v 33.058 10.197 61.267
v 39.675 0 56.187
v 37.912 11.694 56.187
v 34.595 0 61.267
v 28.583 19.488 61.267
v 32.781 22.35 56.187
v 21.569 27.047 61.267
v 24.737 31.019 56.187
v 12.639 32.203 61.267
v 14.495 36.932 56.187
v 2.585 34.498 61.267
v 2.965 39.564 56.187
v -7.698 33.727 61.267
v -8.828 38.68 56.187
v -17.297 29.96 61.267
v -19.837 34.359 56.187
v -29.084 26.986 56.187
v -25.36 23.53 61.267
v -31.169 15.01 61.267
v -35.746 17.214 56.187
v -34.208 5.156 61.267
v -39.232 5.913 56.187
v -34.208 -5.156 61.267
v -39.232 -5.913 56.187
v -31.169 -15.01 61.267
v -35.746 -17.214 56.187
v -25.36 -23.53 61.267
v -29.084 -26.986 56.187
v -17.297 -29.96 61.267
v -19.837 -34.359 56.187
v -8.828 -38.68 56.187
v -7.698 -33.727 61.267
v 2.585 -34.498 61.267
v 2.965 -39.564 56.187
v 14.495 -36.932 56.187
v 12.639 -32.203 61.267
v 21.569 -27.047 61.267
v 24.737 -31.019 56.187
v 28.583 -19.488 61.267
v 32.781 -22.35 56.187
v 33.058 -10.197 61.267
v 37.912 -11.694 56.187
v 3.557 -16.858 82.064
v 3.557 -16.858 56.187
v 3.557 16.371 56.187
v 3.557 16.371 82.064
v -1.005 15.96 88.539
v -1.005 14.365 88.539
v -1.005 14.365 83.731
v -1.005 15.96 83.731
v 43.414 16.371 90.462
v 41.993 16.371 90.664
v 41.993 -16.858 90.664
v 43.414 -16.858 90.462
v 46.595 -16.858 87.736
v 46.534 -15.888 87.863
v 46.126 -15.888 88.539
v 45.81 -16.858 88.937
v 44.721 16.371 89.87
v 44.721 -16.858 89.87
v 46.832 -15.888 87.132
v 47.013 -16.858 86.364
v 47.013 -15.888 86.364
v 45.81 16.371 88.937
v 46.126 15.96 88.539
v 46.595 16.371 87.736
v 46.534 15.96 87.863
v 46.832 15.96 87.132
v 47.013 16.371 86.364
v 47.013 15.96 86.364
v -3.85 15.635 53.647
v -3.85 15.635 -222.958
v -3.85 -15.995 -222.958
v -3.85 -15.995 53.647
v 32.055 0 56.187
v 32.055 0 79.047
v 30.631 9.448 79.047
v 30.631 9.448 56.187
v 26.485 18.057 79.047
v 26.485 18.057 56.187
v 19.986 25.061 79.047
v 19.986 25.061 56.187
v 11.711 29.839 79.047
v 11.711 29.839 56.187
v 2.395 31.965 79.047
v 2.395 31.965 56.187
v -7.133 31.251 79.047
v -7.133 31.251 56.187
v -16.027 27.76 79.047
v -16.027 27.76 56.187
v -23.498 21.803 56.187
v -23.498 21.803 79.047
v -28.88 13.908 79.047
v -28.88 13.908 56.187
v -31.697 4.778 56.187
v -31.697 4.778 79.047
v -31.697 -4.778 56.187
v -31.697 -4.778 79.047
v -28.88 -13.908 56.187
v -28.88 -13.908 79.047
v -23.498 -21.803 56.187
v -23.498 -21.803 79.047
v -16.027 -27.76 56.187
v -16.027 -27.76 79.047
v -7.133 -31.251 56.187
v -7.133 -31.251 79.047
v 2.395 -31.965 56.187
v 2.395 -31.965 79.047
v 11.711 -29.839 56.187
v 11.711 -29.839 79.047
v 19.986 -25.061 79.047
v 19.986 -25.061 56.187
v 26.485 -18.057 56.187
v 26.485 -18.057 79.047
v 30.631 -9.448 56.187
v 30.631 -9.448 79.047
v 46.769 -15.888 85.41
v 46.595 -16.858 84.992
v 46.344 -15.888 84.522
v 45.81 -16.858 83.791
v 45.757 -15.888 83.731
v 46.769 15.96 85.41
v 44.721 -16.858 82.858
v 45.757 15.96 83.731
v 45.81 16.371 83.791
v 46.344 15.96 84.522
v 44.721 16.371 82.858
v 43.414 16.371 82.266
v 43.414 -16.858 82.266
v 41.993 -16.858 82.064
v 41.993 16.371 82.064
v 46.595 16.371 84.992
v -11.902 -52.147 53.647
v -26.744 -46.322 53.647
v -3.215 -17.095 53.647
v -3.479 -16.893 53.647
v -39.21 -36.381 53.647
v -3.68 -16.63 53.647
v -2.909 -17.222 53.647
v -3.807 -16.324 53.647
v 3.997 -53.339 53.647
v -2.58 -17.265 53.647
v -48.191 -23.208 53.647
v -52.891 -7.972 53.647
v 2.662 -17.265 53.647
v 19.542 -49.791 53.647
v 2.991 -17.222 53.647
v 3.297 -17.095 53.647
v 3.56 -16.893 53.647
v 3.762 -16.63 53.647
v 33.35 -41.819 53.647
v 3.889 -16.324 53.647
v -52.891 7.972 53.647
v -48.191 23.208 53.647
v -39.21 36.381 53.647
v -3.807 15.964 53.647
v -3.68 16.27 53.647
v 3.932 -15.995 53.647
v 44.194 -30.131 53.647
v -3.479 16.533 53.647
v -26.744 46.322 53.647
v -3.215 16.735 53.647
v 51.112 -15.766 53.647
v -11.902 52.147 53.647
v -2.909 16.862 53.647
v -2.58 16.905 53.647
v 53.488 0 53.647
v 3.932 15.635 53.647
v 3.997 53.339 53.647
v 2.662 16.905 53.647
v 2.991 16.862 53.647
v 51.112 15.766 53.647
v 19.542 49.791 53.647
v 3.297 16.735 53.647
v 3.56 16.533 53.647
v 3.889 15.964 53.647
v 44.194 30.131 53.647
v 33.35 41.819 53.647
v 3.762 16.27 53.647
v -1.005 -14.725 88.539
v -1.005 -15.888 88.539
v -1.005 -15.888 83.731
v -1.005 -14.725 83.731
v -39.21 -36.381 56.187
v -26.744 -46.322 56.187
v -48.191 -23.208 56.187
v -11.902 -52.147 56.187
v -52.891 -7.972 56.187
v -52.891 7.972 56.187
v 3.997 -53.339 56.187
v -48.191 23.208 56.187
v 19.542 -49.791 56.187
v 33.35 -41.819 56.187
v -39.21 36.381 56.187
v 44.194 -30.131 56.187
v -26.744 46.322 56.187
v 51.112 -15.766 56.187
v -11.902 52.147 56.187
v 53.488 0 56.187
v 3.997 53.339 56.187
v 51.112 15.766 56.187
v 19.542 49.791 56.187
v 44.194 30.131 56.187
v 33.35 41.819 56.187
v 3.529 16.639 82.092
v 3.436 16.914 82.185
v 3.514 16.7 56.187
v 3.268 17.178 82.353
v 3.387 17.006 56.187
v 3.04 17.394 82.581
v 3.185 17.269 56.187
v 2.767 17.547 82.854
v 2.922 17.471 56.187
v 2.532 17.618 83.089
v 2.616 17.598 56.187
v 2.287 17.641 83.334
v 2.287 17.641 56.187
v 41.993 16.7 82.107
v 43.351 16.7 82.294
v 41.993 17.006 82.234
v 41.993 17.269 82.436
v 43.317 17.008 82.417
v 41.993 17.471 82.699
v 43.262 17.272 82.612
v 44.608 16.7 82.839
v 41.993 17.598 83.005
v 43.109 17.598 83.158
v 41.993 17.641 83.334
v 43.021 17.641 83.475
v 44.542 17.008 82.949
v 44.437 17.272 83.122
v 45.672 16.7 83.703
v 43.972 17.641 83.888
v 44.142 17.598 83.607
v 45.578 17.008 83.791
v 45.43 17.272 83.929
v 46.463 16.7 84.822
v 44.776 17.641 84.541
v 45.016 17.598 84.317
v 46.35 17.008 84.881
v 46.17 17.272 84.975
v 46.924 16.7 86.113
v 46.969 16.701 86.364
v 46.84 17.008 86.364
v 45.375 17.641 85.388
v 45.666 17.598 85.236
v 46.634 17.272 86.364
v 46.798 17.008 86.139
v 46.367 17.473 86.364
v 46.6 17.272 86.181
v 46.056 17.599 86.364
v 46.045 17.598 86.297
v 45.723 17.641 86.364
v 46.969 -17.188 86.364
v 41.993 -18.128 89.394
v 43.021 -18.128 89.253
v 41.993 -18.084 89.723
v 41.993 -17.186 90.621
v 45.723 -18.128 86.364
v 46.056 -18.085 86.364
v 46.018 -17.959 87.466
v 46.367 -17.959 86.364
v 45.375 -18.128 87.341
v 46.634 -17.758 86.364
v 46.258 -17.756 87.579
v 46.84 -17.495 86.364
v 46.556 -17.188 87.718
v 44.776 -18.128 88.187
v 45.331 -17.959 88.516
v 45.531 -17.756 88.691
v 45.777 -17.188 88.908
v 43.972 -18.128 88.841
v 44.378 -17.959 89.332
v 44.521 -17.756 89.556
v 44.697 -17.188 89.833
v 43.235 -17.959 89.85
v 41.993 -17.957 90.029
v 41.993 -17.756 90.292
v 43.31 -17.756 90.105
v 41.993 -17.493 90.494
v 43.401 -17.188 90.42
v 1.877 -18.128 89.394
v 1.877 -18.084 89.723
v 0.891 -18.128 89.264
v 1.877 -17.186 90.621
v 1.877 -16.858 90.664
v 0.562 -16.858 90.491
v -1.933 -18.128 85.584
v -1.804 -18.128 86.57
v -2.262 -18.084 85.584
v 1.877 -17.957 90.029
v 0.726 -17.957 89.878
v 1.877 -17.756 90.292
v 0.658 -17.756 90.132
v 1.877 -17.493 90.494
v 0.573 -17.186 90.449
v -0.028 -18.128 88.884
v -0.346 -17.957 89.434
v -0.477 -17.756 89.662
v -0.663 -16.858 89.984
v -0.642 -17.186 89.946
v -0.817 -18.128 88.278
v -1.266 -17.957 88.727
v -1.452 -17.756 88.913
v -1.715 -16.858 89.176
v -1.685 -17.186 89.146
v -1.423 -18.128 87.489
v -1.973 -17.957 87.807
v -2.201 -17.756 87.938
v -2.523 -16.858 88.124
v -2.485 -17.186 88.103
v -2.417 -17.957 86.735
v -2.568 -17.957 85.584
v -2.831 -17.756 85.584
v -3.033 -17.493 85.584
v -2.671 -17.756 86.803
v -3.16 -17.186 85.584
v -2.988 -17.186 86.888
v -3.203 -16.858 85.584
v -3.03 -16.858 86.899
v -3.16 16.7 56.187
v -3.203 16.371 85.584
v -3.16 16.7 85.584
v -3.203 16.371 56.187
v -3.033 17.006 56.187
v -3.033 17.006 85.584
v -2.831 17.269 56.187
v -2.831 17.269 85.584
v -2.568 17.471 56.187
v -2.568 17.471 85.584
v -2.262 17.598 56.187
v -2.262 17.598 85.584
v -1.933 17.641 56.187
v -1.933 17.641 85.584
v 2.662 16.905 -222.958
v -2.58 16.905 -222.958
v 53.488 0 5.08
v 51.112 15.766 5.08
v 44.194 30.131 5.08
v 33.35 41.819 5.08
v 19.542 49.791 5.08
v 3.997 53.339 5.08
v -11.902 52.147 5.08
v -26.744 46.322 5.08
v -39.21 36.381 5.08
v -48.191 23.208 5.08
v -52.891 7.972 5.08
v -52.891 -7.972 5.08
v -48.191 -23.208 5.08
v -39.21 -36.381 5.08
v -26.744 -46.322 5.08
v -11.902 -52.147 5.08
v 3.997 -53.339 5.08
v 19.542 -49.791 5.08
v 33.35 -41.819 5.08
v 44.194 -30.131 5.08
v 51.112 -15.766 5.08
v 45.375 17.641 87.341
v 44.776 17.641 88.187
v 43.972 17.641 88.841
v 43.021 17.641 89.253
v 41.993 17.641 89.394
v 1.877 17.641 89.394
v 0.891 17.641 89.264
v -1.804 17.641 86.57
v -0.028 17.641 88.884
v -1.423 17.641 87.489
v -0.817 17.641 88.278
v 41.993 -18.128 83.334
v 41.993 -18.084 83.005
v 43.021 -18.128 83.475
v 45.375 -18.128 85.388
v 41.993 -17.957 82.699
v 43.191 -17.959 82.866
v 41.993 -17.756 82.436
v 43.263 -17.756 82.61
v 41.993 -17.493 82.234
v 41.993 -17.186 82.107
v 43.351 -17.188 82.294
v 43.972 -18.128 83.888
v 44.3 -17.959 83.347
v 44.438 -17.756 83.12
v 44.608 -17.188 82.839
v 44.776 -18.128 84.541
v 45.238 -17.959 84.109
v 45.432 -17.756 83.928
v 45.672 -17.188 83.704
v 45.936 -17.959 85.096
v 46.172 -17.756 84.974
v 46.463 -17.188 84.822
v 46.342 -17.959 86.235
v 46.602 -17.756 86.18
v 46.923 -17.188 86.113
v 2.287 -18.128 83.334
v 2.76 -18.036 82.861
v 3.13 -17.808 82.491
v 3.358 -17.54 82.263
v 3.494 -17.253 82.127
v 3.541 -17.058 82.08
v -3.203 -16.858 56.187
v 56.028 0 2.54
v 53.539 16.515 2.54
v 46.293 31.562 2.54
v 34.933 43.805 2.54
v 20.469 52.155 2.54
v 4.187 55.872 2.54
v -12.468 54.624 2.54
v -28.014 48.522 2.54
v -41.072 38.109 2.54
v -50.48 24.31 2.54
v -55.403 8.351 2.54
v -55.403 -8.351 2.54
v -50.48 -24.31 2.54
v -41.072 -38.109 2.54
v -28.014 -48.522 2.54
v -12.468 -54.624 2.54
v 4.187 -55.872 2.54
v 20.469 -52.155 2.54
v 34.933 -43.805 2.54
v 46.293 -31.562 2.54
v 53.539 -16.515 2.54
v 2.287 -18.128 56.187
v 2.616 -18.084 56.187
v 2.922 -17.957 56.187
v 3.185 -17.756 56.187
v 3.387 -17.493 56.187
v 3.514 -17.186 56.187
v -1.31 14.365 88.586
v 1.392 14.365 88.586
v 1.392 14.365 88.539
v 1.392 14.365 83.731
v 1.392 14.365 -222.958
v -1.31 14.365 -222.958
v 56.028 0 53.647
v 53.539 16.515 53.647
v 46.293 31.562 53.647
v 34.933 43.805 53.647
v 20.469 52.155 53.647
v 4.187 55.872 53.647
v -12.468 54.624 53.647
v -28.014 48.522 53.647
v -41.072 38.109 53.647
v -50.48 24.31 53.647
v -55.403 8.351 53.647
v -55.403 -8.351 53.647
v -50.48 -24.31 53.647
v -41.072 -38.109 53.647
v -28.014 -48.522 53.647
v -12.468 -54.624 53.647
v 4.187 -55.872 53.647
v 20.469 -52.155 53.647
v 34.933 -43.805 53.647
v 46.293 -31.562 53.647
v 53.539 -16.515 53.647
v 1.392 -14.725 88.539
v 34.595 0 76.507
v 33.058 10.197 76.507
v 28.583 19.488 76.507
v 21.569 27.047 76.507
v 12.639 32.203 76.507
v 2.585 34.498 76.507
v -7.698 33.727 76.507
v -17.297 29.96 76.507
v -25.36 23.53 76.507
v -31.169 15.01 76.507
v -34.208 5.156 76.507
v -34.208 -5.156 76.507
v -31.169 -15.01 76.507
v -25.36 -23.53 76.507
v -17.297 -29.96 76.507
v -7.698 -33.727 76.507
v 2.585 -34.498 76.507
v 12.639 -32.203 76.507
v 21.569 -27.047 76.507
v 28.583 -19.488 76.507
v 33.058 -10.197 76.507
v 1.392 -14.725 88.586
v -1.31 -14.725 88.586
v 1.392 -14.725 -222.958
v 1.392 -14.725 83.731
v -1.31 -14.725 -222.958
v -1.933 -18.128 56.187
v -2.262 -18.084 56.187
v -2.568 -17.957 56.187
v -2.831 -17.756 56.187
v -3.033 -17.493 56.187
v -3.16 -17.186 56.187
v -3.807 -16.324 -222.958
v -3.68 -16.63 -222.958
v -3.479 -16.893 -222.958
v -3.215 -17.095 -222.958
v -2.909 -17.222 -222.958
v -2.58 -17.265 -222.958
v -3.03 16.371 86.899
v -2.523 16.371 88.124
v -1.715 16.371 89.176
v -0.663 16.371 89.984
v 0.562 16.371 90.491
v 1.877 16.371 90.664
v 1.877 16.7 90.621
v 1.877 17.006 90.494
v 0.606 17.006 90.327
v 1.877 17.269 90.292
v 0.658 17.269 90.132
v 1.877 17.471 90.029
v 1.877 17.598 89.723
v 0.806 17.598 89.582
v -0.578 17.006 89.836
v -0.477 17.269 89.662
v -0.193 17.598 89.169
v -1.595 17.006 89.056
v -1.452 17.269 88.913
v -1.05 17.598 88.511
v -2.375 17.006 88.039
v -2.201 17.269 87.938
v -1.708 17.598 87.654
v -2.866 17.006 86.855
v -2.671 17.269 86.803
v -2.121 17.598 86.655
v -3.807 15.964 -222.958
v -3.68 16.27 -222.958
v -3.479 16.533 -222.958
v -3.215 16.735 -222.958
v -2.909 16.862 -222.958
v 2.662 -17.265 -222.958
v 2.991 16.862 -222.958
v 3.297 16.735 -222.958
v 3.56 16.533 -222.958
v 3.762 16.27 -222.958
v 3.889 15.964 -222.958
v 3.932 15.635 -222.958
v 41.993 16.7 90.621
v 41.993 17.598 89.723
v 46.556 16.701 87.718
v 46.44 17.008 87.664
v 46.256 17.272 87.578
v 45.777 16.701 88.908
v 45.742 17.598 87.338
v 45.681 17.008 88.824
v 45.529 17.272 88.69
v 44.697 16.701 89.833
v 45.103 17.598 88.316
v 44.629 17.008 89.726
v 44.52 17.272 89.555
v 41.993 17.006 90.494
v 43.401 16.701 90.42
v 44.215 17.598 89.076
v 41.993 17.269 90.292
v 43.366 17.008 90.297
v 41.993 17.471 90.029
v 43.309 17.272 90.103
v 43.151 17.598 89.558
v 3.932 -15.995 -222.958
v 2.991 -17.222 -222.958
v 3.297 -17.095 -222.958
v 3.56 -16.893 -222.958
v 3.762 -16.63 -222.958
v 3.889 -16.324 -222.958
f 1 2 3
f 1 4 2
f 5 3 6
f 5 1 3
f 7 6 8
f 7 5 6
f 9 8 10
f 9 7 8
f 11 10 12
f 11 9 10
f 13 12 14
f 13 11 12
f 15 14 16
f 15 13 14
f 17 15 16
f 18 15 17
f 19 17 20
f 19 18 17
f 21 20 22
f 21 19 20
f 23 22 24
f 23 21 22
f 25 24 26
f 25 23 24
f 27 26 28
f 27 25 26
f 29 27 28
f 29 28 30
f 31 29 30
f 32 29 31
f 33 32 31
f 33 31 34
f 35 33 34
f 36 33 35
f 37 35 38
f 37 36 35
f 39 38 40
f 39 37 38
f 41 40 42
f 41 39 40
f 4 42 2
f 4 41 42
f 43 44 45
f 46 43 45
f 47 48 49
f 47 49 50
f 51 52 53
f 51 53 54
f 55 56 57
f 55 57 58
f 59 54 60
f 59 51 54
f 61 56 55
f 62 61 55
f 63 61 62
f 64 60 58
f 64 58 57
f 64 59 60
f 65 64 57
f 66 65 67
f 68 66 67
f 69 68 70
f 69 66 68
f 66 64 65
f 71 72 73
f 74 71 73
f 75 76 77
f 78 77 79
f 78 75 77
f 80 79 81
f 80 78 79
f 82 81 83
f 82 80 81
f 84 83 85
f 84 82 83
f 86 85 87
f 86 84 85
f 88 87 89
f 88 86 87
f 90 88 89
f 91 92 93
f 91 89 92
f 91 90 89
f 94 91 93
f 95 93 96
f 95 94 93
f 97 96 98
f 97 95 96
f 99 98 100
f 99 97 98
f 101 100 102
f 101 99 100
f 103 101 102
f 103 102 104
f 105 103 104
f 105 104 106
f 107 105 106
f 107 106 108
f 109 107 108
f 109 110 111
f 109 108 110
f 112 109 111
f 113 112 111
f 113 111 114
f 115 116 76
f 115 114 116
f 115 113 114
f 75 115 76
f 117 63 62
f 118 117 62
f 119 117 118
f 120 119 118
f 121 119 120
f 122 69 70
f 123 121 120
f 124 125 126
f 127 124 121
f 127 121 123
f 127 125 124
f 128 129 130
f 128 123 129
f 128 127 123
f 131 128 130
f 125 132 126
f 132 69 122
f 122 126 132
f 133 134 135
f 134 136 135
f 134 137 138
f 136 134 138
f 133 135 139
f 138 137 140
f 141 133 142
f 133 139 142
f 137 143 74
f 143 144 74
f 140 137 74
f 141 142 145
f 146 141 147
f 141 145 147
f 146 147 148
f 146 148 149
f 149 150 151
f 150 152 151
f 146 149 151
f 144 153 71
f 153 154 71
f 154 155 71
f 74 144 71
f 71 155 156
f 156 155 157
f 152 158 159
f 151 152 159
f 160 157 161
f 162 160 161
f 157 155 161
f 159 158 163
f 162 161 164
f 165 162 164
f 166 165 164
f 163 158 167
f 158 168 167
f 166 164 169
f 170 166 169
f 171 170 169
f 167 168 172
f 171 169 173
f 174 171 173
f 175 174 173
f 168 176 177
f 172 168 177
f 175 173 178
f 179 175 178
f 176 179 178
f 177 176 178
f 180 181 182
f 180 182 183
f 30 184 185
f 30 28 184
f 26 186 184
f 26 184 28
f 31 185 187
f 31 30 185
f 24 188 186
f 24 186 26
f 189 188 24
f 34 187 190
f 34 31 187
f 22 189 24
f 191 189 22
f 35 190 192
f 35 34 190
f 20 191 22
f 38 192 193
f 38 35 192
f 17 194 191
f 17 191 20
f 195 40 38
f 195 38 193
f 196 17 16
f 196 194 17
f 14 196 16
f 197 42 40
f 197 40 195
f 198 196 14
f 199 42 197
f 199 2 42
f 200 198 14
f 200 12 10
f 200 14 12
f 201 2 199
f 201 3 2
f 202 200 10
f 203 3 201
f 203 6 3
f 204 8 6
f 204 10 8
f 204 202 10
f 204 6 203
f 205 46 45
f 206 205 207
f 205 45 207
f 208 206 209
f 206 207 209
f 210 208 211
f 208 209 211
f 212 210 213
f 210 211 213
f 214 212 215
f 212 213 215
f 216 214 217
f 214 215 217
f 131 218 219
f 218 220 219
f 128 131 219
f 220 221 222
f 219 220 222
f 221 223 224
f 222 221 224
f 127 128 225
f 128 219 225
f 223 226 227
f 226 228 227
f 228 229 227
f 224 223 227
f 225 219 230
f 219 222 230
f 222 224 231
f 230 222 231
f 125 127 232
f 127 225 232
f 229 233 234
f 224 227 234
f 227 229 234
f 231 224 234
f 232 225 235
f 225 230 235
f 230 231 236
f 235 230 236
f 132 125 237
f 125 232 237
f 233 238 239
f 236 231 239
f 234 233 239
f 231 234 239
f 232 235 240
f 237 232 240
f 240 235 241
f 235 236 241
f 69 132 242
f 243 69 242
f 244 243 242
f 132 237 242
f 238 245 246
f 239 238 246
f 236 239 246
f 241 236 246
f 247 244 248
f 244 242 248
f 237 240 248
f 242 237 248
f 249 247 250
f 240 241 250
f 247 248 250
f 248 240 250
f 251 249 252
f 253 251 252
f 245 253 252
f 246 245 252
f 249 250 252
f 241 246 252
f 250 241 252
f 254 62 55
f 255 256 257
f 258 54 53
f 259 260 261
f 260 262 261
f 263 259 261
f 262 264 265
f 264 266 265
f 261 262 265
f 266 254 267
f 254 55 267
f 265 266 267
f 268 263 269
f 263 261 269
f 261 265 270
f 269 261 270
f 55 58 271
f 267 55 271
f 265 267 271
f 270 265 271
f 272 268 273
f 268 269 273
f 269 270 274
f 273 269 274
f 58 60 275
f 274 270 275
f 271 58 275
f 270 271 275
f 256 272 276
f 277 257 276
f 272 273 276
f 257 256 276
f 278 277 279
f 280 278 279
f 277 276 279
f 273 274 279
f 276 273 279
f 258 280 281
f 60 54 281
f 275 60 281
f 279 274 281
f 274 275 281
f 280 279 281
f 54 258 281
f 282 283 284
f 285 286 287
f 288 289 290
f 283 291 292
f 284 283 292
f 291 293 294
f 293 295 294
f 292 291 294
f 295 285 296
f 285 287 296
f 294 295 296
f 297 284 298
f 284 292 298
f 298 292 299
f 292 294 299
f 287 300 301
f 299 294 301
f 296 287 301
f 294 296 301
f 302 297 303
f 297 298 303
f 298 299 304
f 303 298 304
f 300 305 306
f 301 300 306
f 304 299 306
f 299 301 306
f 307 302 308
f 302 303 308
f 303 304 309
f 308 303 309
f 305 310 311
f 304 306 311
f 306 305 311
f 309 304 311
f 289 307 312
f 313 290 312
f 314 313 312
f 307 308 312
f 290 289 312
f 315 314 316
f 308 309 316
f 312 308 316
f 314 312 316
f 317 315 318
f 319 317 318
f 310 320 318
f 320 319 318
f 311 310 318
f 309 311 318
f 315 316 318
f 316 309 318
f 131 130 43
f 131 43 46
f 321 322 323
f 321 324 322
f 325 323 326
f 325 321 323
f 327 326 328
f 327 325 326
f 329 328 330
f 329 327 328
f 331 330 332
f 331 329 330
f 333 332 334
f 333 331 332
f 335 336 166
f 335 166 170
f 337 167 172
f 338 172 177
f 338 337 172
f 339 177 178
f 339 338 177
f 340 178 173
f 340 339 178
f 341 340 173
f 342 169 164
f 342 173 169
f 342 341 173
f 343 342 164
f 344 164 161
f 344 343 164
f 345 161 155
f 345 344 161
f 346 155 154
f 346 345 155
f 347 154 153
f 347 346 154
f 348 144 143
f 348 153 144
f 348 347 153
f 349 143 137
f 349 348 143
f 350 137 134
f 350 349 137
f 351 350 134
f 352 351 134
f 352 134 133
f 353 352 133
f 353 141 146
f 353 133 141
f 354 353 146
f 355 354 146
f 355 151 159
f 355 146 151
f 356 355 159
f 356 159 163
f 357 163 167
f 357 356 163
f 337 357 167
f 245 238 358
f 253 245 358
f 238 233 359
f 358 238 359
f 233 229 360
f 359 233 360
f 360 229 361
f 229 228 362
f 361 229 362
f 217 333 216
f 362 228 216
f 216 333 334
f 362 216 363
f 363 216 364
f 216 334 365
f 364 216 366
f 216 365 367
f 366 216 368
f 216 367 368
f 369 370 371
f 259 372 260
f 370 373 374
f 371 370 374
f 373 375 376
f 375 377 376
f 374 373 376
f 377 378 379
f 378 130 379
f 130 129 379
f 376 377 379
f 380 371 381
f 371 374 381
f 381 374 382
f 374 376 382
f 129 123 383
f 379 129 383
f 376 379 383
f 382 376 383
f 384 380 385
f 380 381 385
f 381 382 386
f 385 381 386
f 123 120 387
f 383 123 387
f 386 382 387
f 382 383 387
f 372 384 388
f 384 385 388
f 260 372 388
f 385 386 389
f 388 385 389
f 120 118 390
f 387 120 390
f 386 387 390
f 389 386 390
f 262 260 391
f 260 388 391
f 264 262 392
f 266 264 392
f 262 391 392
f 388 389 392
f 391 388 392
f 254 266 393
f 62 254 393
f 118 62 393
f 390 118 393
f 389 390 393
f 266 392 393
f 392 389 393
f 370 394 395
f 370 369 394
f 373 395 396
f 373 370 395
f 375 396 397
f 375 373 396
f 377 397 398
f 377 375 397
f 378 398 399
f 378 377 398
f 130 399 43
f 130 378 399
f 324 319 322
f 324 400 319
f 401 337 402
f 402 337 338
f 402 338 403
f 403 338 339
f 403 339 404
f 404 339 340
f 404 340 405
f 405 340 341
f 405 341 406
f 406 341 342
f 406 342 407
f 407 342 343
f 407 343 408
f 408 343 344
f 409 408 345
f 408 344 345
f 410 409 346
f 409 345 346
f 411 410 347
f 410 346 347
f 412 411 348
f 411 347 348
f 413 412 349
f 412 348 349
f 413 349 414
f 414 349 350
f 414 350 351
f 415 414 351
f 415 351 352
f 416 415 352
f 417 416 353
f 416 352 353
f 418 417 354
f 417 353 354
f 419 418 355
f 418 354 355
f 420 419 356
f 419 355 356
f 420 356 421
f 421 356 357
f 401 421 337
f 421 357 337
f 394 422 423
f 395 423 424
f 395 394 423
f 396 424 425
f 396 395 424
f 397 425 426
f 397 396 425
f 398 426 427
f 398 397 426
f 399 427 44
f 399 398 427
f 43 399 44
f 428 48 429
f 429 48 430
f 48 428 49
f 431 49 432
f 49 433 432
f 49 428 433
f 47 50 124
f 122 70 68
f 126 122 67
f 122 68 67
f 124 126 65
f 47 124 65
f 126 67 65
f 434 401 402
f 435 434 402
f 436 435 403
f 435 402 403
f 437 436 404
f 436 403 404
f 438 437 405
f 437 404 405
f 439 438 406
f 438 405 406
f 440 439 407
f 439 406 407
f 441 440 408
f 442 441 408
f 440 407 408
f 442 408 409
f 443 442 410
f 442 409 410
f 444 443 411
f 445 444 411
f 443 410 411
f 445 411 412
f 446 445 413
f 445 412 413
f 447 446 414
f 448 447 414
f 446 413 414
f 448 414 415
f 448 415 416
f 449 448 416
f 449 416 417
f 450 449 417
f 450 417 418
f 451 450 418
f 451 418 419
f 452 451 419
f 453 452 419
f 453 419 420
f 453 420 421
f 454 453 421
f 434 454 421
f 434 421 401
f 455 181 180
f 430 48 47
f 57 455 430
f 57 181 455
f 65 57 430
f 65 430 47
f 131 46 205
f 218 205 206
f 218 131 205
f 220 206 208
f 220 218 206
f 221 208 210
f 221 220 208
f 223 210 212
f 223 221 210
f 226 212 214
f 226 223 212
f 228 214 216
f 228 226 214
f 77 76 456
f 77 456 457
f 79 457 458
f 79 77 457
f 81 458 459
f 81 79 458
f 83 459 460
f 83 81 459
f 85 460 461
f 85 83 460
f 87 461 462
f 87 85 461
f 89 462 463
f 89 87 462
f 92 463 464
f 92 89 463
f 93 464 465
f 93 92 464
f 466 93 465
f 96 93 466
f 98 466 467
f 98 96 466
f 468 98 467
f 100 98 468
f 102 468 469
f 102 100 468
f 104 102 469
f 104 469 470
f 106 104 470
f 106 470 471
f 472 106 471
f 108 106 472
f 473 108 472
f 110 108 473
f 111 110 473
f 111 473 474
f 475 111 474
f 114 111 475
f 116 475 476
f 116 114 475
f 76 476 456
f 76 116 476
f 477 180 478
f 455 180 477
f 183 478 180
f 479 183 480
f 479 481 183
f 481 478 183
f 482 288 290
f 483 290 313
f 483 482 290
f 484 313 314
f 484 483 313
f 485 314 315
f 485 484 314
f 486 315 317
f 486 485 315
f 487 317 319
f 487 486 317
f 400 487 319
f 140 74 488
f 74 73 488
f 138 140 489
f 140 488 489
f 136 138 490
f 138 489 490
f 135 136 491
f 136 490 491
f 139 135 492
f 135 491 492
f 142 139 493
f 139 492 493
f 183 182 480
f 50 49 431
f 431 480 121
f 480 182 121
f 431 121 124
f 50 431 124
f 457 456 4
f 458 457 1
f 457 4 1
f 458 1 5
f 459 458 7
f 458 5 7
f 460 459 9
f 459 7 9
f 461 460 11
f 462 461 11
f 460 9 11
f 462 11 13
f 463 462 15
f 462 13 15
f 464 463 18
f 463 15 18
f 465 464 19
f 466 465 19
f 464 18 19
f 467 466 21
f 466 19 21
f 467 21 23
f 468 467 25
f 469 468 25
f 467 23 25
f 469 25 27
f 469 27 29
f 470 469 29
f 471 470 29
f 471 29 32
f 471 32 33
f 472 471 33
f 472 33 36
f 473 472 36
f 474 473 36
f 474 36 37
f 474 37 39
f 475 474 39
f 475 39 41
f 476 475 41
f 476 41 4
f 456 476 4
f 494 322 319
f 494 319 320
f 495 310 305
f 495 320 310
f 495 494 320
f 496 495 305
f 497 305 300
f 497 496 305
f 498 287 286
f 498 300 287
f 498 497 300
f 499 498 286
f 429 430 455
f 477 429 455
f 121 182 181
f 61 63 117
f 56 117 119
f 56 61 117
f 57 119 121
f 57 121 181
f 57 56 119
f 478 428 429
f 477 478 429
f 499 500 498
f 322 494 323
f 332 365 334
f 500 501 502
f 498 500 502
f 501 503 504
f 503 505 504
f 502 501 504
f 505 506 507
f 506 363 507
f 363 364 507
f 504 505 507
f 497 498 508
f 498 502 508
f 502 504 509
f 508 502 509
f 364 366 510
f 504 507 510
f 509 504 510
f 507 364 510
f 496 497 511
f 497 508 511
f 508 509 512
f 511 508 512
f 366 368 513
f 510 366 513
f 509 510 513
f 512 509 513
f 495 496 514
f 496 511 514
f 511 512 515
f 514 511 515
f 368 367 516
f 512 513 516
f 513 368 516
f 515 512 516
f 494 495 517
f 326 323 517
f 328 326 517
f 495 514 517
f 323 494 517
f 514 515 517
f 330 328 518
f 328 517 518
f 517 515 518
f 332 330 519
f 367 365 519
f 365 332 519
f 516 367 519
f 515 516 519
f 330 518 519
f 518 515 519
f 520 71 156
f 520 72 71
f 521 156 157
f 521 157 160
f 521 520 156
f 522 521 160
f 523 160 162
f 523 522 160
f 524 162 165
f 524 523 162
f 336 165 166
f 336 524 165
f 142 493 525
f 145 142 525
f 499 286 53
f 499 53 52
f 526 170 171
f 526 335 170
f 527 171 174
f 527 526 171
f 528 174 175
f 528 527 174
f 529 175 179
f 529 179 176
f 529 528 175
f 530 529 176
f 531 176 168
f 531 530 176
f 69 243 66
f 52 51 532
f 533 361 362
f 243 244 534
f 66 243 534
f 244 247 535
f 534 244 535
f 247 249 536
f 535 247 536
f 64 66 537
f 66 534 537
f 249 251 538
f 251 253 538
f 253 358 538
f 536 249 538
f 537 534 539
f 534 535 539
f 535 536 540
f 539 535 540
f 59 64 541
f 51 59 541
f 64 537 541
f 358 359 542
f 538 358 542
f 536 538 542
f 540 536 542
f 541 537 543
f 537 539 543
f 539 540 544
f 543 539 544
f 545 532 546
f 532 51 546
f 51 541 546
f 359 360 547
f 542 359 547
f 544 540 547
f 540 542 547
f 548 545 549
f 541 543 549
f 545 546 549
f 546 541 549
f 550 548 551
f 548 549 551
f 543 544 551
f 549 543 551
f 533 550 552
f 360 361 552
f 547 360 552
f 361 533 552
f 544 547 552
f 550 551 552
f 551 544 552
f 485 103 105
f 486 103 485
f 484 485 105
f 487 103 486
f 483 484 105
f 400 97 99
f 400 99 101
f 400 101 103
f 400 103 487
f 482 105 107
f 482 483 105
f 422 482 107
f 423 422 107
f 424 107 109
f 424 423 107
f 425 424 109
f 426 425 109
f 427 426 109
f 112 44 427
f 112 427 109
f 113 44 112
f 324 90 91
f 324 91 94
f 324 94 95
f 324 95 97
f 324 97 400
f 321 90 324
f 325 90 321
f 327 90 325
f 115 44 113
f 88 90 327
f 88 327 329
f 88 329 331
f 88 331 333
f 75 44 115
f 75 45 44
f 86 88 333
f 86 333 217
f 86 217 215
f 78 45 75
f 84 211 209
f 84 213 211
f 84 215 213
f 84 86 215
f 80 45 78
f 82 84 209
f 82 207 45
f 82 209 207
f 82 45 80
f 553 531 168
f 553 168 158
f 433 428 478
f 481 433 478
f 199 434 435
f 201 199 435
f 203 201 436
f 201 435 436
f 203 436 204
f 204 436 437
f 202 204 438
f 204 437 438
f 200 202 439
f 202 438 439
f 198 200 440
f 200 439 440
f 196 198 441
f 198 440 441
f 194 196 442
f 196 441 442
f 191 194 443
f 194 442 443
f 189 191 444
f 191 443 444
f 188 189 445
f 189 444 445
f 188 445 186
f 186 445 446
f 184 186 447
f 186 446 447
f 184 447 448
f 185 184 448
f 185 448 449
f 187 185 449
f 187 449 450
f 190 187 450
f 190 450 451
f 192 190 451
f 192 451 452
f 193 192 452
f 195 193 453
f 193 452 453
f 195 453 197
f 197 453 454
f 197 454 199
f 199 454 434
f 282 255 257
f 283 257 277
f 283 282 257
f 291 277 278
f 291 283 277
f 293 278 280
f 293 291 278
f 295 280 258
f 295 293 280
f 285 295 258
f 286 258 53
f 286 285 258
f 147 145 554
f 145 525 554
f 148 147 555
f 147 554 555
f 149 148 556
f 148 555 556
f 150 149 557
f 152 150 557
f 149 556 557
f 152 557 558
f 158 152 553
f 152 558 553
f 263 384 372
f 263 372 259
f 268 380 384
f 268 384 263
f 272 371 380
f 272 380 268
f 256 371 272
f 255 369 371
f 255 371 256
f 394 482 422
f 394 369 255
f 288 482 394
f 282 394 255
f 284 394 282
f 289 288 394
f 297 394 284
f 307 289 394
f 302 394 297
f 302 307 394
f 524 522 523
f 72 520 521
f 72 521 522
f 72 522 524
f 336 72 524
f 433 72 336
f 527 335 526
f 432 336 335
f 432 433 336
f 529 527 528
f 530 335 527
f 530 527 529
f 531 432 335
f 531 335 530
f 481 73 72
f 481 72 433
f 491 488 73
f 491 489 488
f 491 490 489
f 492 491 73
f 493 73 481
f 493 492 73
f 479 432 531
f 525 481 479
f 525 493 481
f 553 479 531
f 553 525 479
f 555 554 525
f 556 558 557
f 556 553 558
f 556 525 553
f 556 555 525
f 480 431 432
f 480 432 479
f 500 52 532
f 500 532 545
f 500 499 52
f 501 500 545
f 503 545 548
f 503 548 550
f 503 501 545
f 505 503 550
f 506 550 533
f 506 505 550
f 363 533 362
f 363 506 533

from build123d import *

# Parameters (mm, degrees)
F0_R         = 56.0284560605
F1_DEPTH     = 56.18732
F2_T         = -2.54
F3_W         = 7.7828075737
F3_H         = 34.1701302677
F4_DEPTH     = 276.60562
F6_R         = 34.5946759053
F7_DEPTH     = 25.4
F8_T         = 2.54
F8_T3_DEPTH  = 39.2501302677
F8_T5_DEPTH  = 12.8628075737
F10_SIZE     = 2.54
F11_W        = 6.7604319192
F11_H        = 35.768898204
F12_DEPTH    = 28.2828
F13_W        = 6.7604319192
F13_H        = 35.768898204
F14_DEPTH    = 6.19419
F15_W        = 35.768898204
F15_H        = 8.6004413581
F16_DEPTH    = 43.51639
F17_W        = 31.8477451801
F17_H        = 4.8072040081
F18_DEPTH    = 48.07886
F19_DEPTH    = 32.39902
F20_R        = 5.08
F21_T1_DEPTH = 61.168898204
F22_R        = 1.27


# Not quite as in the source:
# - a fillet or chamfer that OpenCascade refuses, or shapes differently, is made with other operations: its cross-section is extruded or revolved along the edge and cut away or added
# - a shell that OpenCascade refuses in one call is made with other operations: the cavity is built on its own and cut out


with BuildPart() as f1:
    # F0 (on Top) → F1 (new body)
    with BuildSketch(Plane.XY):
        Circle(F0_R)
    extrude(amount=F1_DEPTH)

    # F2
    f2_openings = [f1.faces().sort_by_distance(p)[0] for p in [
        (0, 0, 0),
    ]]
    offset(amount=F2_T, openings=f2_openings)

    # F3 (on face) → F4 (join)
    with BuildSketch(Plane(origin=(0, 0, 53.64732), x_dir=(1, 0, 0), z_dir=(0, 0, -1))):
        with Locations((0.0409056073, 0.1802544365)):
            Rectangle(F3_W, F3_H)
    extrude(amount=F4_DEPTH)

    # F5: chamfer of 5.08 on 1 edges, made by hand

    # F5_s1 → F5_t2 (revolve, cut)
    with BuildSketch(Plane.XZ):
        Polygon((58.5684560605, 0), (53.4884560605, 5.08), (53.4884560605, 0), align=None)
    revolve(axis=Axis((0, 0, 0), (0, 0, 1)), mode=Mode.SUBTRACT)

    # F6 (on face) → F7 (join)
    with BuildSketch(Plane.XY.offset(56.18732)):
        Circle(F6_R)
    extrude(amount=F7_DEPTH)

    # F8: shell of thickness 2.54, made by hand


with BuildPart() as f8_core1:
    # F8_t2: copy of F1
    add(f1.part)

    # the walls: a layer under each face that stays
    f8_faces = [f8_core1.faces().sort_by_distance(p)[0] for p in [
        (-56.0284560605, 0, 29.36366),
        (-54.7584560605, 0, 3.81),
        (-37.3523040403, -37.3523040403, 56.18732),
        (-53.4884560605, 0, 29.36366),
        (-34.5946759053, 0, 68.88732),
        (-35.658970707, -35.658970707, 53.64732),
        (3.9323093942, -0.1802544365, -84.65549),
        (0.0409056073, 16.9048106974, -84.65549),
        (-3.8504981795, -0.1802544365, -84.65549),
        (0.0409056073, -17.2653195703, -84.65549),
    ]]
    thicken(f8_faces, amount=-F8_T, mode=Mode.SUBTRACT)

    # F8_s4 → F8_t3 (cut)
    with BuildSketch(Plane.XZ.offset(-19.4448106974)):
        Polygon((3.9577093942, 53.62192), (3.9323093942, 56.18732), (1.3923093942, 56.18732), (1.3923093942, 53.64732), align=None)
        Polygon((-3.8758981795, 53.62192), (-3.8504981795, 56.18732), (-1.3104981795, 56.18732), (-1.3104981795, 53.64732), align=None)
    extrude(amount=F8_T3_DEPTH, mode=Mode.SUBTRACT)

    # F8_s6 → F8_t5 (cut)
    with BuildSketch(Plane.YZ.offset(-6.3904981795)):
        Polygon((16.9302106974, 53.62192), (16.9048106974, 56.18732), (14.3648106974, 56.18732), (14.3648106974, 53.64732), align=None)
        Polygon((-17.2907195703, 53.62192), (-17.2653195703, 56.18732), (-14.7253195703, 56.18732), (-14.7253195703, 53.64732), align=None)
    extrude(amount=F8_T5_DEPTH, mode=Mode.SUBTRACT)

    # F8_s7 → F8_t8 (revolve, cut)
    with BuildSketch(Plane.XZ):
        Polygon((34.6200759053, 56.21272), (34.5946759053, 53.64732), (32.0546759053, 53.64732), (32.0546759053, 56.18732), align=None)
    revolve(axis=Axis((0, 0, 56.18732), (0, 0, 1)), mode=Mode.SUBTRACT)

    # F8_s9 → F8_t10 (revolve, cut)
    with BuildSketch(Plane.XZ):
        Polygon((53.4630560605, 53.62192), (56.0284560605, 53.64732), (56.0284560605, 56.18732), (53.4884560605, 56.18732), align=None)
    revolve(axis=Axis((0, 0, 53.64732), (0, 0, -1)), mode=Mode.SUBTRACT)


with BuildPart() as f1_1:
    add(f1.part)

    # what is left inside the walls is the cavity
    f8_cavity = [f8_core1.part.solids().sort_by_distance(p)[0] for p in [
        (1.366909, -5.028609, -83.38549),
    ]]
    add(f8_cavity, mode=Mode.SUBTRACT)

    # F9: chamfer of 5.08 on 2 edges, made by hand

    # F9_s1 → F9_t2 (revolve)
    with BuildSketch(Plane.XZ):
        Polygon((39.6746759053, 56.18732), (34.5946759053, 61.26732), (34.5946759053, 56.18732), align=None)
    revolve(axis=Axis((0, 0, 56.18732), (0, 0, 1)))

    # F9_s3 → F9_t4 (revolve, cut)
    with BuildSketch(Plane.XZ):
        Polygon((34.5946759053, 76.50732), (29.5146759053, 81.58732), (34.5946759053, 81.58732), align=None)
    revolve(axis=Axis((0, 0, 81.58732), (0, 0, 1)), mode=Mode.SUBTRACT)

    # F10
    f10_edges = [f1_1.edges().sort_by_distance(p)[0] for p in [
        (-56.028456, 0, 56.18732),
    ]]
    chamfer(f10_edges, length=F10_SIZE)

    # F11 (on face) → F12 (join)
    with BuildSketch(Plane.XY.offset(56.18732)):
        with Locations((0.176892383, -0.2430817112)):
            Rectangle(F11_W, F11_H)
    extrude(amount=F12_DEPTH)

    # F13 (on face) → F14 (join)
    with BuildSketch(Plane.XY.offset(84.47012)):
        with Locations((0.176892383, -0.2430817112)):
            Rectangle(F13_W, F13_H)
    extrude(amount=F14_DEPTH)

    # F15 (on face) → F16 (join)
    with BuildSketch(Plane.YZ.offset(3.5571083426)):
        with Locations((-0.2430817112, 86.3640893209)):
            Rectangle(F15_W, F15_H)
    extrude(amount=F16_DEPTH)

    # F17 (on face) → F18 (cut)
    with BuildSketch(Plane.YZ.offset(47.0734983426)):
        with Locations((0.0361893326, 86.1349776387)):
            Rectangle(F17_W, F17_H)
    extrude(amount=-F18_DEPTH, mode=Mode.SUBTRACT)

    # F19 (cut): a face of the model
    f19_faces = [f1_1.faces().sort_by_distance(p)[0] for p in [
        (0.0409056074, -0.1802544364, 56.18732),
    ]]
    extrude(f19_faces, amount=-F19_DEPTH, mode=Mode.SUBTRACT)

    # F20
    f20_edges = [f1_1.edges().sort_by_distance(p)[0] for p in [
        (-3.203324, -0.243082, 90.66431),
    ]]
    fillet(f20_edges, radius=F20_R)

    # F21: fillet of radius 5.08 on 2 edges, made by hand

    # F21_s2 → F21_t1 (cut)
    with BuildSketch(Plane.XZ.offset(-30.3413673908)):
        with BuildLine():
            ThreePointArc((41.9934983426, 90.66431), (45.5856007911, 89.1764124484), (47.0734983426, 85.58431))
            Line((47.0734983426, 85.58431), (47.0734983426, 90.66431))
            Line((47.0734983426, 90.66431), (41.9934983426, 90.66431))
        make_face()
        with BuildLine():
            ThreePointArc((47.0734983426, 87.1438686419), (45.5856007911, 83.5517661934), (41.9934983426, 82.0638686419))
            Line((41.9934983426, 82.0638686419), (47.0734983426, 82.0638686419))
            Line((47.0734983426, 82.0638686419), (47.0734983426, 87.1438686419))
        make_face()
    extrude(amount=F21_T1_DEPTH, mode=Mode.SUBTRACT)

    # F22
    f22_edges = [f1_1.edges().sort_by_distance(p)[0] for p in [
        (21.935087, -18.127531, 90.66431),
        (21.935087, 17.641367, 90.66431),
        (22.775303, -18.127531, 82.063869),
        (22.775303, 17.641367, 82.063869),
        (3.557108, -18.127531, 69.125594),
        (3.557108, 17.641367, 69.125594),
        (3.932309, 16.904811, -84.65549),
        (3.932309, -17.26532, -84.65549),
        (-3.850498, 16.904811, -84.65549),
        (-3.850498, -17.26532, -84.65549),
    ]]
    fillet(f22_edges, radius=F22_R)


solid = f1_1.part
